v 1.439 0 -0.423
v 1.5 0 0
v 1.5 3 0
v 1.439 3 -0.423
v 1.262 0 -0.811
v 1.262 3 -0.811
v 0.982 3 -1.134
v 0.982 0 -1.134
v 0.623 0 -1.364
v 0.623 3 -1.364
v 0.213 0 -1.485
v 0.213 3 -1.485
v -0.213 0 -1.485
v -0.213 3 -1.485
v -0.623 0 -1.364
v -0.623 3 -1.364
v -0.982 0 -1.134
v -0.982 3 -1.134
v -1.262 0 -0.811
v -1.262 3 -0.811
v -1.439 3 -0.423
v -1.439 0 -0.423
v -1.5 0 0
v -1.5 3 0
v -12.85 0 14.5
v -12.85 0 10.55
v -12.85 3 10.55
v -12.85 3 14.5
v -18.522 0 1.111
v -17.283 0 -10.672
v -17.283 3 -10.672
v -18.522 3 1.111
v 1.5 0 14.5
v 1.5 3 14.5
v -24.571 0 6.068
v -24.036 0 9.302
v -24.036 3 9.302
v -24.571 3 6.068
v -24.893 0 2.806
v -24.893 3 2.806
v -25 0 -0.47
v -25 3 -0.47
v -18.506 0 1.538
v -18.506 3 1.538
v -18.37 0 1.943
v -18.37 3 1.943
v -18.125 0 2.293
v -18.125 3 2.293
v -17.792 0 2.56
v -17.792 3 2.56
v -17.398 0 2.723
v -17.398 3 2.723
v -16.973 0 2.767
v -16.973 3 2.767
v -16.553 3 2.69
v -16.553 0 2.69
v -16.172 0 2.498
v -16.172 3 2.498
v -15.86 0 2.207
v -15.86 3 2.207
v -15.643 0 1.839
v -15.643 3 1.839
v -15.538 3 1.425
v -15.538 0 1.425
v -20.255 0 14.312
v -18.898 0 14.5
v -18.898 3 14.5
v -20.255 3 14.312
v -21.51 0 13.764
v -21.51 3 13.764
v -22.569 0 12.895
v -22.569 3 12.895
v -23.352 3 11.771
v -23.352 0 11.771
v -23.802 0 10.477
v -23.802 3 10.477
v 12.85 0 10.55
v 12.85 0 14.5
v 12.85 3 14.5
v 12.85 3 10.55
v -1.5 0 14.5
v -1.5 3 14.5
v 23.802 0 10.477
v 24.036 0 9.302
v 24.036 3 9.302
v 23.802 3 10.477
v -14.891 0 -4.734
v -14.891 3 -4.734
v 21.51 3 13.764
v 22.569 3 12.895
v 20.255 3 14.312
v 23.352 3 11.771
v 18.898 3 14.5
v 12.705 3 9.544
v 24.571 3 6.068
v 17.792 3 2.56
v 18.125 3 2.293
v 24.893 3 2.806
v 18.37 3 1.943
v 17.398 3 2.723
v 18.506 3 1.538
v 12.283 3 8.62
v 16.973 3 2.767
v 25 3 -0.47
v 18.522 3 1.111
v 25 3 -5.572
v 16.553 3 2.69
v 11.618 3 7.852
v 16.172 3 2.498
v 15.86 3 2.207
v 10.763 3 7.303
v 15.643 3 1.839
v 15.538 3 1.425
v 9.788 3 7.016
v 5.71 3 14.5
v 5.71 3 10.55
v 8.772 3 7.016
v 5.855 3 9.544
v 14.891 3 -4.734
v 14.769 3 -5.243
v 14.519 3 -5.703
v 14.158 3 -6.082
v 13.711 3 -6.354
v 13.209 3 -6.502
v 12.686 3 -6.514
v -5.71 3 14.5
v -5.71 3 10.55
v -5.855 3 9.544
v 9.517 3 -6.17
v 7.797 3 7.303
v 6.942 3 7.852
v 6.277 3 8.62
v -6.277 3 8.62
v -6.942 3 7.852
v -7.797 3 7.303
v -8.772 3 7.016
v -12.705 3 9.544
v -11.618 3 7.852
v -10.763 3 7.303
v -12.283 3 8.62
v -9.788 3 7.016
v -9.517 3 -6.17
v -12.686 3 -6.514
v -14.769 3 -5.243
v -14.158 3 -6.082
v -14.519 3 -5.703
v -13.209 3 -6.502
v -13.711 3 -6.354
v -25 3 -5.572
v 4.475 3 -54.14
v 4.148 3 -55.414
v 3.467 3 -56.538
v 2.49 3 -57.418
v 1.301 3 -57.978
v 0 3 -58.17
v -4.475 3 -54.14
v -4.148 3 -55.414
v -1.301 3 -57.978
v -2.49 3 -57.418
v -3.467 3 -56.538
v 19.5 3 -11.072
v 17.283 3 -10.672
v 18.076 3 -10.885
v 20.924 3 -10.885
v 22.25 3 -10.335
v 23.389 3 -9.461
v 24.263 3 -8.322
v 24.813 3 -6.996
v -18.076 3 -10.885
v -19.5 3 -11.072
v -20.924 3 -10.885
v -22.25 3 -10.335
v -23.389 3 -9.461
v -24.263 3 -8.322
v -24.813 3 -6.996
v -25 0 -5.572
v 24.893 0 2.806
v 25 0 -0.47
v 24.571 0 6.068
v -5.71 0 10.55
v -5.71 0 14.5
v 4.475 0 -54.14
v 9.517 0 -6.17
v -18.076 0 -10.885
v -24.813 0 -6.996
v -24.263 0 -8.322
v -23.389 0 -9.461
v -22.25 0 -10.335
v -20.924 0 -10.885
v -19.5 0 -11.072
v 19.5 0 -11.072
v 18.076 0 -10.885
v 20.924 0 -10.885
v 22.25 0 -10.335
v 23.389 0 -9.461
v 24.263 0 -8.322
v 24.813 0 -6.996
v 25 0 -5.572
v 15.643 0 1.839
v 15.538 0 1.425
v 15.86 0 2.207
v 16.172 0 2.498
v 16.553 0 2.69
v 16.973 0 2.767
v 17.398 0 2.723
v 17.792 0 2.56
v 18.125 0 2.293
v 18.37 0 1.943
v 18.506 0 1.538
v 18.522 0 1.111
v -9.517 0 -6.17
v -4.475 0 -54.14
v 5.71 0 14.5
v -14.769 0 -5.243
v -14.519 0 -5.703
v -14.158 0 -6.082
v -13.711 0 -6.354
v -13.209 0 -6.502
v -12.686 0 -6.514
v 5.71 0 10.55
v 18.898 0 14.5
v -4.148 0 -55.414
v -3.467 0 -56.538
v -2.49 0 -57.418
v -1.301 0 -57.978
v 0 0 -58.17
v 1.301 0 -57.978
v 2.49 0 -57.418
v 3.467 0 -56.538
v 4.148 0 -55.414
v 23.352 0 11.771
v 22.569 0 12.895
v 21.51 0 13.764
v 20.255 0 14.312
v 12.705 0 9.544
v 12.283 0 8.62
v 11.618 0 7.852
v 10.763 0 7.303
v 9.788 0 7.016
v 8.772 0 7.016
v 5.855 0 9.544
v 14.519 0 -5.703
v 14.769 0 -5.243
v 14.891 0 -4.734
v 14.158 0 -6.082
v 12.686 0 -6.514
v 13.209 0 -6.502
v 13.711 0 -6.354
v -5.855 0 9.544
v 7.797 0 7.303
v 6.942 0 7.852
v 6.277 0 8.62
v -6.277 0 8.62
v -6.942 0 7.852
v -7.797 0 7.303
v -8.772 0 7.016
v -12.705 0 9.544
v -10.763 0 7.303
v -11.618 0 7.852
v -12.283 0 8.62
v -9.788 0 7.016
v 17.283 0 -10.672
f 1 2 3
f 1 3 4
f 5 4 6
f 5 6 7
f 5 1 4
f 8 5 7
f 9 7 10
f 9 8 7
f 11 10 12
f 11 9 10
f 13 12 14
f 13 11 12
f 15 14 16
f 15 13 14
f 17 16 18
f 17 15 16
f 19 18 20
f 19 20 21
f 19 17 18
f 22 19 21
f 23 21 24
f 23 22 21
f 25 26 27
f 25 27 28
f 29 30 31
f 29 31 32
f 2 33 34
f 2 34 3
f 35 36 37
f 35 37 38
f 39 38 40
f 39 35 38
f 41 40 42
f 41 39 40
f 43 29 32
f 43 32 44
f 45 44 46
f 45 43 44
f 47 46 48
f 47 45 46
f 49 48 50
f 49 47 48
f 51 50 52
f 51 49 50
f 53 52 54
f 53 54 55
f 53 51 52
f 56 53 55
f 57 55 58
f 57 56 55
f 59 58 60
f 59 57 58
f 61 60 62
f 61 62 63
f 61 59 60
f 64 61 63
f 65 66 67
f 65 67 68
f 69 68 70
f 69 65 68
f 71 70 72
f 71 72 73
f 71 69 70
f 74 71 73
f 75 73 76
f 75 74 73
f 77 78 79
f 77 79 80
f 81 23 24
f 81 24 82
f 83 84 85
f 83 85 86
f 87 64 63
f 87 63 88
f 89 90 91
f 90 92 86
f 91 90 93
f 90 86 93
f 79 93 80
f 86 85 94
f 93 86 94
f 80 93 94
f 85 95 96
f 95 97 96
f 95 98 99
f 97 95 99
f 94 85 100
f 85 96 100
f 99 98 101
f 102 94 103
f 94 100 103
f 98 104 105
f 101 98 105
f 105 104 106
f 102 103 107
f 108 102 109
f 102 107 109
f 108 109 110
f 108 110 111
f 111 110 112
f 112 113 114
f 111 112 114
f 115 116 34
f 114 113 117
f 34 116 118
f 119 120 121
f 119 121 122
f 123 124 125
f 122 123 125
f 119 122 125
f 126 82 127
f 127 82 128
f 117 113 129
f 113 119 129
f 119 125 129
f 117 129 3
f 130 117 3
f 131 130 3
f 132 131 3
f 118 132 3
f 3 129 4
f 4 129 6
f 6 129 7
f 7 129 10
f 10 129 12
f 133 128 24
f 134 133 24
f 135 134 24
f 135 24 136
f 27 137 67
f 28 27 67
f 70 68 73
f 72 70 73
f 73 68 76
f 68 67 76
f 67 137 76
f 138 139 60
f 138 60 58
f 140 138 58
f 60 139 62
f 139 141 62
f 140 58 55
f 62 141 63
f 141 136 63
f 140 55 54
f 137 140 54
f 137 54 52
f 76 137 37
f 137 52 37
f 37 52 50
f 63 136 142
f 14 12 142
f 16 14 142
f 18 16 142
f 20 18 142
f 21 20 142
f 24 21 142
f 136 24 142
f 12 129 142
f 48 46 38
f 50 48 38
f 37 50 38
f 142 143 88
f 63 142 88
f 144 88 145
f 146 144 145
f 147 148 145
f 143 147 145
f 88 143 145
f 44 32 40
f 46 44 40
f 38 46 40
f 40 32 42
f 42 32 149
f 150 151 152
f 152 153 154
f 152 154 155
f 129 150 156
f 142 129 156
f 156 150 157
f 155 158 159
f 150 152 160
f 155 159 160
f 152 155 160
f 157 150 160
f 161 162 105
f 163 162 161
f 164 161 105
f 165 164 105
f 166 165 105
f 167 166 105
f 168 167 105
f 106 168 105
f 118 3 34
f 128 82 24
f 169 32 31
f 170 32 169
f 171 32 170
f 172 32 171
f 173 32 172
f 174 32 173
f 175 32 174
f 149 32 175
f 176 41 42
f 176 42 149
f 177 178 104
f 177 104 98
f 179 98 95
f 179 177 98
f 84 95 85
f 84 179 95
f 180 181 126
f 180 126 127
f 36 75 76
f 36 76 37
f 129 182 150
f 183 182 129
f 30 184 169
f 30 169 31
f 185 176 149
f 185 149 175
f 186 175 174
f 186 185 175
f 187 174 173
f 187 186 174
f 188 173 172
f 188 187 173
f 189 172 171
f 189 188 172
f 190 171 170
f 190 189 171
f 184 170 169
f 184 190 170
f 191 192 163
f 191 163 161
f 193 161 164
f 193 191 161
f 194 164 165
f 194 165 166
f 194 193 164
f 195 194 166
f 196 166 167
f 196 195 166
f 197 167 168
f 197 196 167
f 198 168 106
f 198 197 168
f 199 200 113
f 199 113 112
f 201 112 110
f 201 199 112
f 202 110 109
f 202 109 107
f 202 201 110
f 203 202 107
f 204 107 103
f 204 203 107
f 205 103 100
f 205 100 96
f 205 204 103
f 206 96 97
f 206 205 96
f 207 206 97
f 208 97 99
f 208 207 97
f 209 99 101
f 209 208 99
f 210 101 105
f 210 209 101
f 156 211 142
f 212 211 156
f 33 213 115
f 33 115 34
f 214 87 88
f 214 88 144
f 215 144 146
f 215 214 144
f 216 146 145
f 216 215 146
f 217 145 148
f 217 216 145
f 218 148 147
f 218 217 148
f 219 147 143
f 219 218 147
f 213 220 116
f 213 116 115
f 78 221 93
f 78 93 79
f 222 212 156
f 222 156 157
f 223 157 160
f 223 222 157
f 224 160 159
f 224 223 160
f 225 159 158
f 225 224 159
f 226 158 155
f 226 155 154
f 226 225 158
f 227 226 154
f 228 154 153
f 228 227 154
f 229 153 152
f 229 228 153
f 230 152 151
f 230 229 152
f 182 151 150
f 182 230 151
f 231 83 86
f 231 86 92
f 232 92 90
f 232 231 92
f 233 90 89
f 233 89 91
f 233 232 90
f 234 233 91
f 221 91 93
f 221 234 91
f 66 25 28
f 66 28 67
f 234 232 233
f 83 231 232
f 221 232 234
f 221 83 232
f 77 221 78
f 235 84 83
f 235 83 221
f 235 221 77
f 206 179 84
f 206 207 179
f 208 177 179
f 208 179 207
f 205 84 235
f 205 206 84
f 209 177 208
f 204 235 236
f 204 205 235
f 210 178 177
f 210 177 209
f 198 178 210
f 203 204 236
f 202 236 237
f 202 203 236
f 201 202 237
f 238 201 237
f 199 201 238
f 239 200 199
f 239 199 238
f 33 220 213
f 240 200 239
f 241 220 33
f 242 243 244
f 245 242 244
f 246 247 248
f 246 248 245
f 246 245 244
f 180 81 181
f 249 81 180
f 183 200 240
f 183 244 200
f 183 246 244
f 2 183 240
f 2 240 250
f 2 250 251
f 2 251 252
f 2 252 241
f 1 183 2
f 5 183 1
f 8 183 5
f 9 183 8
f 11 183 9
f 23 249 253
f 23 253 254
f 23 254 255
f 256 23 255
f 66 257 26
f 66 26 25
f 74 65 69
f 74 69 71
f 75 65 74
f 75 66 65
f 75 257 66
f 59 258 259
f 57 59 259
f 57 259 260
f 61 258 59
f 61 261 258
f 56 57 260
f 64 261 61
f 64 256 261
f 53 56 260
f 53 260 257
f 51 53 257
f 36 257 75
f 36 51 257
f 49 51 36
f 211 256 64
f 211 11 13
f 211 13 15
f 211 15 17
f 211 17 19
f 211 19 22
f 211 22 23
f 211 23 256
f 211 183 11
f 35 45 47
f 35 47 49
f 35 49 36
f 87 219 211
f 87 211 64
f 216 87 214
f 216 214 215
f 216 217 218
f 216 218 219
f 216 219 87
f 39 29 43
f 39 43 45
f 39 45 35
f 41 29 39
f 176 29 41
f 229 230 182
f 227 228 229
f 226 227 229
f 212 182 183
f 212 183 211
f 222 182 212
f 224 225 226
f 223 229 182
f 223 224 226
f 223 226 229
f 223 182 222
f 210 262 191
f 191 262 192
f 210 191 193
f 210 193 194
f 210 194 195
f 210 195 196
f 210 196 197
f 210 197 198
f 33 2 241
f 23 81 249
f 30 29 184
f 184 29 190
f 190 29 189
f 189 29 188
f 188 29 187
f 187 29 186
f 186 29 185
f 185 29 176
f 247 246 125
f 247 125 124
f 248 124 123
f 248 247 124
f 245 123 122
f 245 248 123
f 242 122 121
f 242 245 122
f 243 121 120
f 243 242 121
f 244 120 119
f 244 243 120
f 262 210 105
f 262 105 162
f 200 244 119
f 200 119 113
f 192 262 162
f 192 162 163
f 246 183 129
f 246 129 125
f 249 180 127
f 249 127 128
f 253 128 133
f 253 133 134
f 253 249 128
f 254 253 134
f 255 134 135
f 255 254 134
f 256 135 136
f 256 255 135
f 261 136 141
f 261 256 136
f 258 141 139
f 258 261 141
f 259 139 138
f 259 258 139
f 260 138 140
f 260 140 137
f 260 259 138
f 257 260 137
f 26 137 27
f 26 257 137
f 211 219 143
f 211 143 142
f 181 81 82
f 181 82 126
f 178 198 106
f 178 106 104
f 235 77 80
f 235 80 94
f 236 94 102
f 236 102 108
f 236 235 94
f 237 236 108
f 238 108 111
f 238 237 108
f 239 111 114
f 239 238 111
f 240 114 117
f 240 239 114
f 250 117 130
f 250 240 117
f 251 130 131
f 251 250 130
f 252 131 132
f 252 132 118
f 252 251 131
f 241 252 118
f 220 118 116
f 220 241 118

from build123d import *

# Parameters (mm, degrees)
BOSS_EXTRUDE1_DEPTH = 3


with BuildPart() as part:
    # Sketch1 → Boss-Extrude1 (new body)
    with BuildSketch(Plane(origin=(0, 0, 0), x_dir=(1, 0, 0), z_dir=(0, 1, 0))):
        with BuildLine():
            Line((4.475348529, 54.140378085), (9.517238433, 6.17))
            Line((9.517238433, 6.17), (12.686230549, 6.513661021))
            ThreePointArc((12.686230549, 6.513661021), (14.15792829, 6.081687043), (14.890899928, 4.734375521))
            Line((14.890899928, 4.734375521), (15.538277417, -1.425009852))
            ThreePointArc((15.538277417, -1.425009852), (17.186852955, -2.76), (18.521843103, -1.111424462))
            Line((18.521843103, -1.111424462), (17.283321421, 10.672322207))
            Line((17.283321421, 10.672322207), (18.076495252, 10.884852494))
            ThreePointArc((18.076495252, 10.884852494), (22.84818786, 9.935703821), (25, 5.572260449))
            Line((25, 5.572260449), (25, 0.469626618))
            ThreePointArc((25, 0.469626618), (24.758369054, -4.440028067), (24.035811635, -9.302229772))
            Line((24.035811635, -9.302229772), (23.801666433, -10.477185639))
            ThreePointArc((23.801666433, -10.477185639), (22.069368276, -13.36561303), (18.89808527, -14.5))
            Line((18.89808527, -14.5), (12.85, -14.5))
            Line((12.85, -14.5), (12.85, -10.55))
            ThreePointArc((12.85, -10.55), (9.28, -6.98), (5.71, -10.55))
            Line((5.71, -10.55), (5.71, -14.5))
            Line((5.71, -14.5), (1.5, -14.5))
            Line((1.5, -14.5), (1.5, 0))
            ThreePointArc((1.5, 0), (0, 1.5), (-1.5, 0))
            Line((-1.5, 0), (-1.5, -14.5))
            Line((-1.5, -14.5), (-5.71, -14.5))
            Line((-5.71, -14.5), (-5.71, -10.55))
            ThreePointArc((-5.71, -10.55), (-9.28, -6.98), (-12.85, -10.55))
            Line((-12.85, -10.55), (-12.85, -14.5))
            Line((-12.85, -14.5), (-18.89808527, -14.5))
            ThreePointArc((-18.89808527, -14.5), (-22.069368276, -13.36561303), (-23.801666433, -10.477185639))
            Line((-23.801666433, -10.477185639), (-24.035811635, -9.302229772))
            ThreePointArc((-24.035811635, -9.302229772), (-24.758369054, -4.440028067), (-25, 0.469626618))
            Line((-25, 0.469626618), (-25, 5.572260449))
            ThreePointArc((-25, 5.572260449), (-22.84818786, 9.935703821), (-18.076495252, 10.884852494))
            Line((-18.076495252, 10.884852494), (-17.283321421, 10.672322207))
            Line((-17.283321421, 10.672322207), (-18.521843103, -1.111424462))
            ThreePointArc((-18.521843103, -1.111424462), (-17.186852955, -2.76), (-15.538277417, -1.425009852))
            Line((-15.538277417, -1.425009852), (-14.890899928, 4.734375521))
            ThreePointArc((-14.890899928, 4.734375521), (-14.15792829, 6.081687043), (-12.686230549, 6.513661021))
            Line((-12.686230549, 6.513661021), (-9.517238433, 6.17))
            Line((-9.517238433, 6.17), (-4.475348529, 54.140378085))
            ThreePointArc((-4.475348529, 54.140378085), (0, 58.17), (4.475348529, 54.140378085))
        make_face()
    extrude(amount=BOSS_EXTRUDE1_DEPTH)


solid = part.part
